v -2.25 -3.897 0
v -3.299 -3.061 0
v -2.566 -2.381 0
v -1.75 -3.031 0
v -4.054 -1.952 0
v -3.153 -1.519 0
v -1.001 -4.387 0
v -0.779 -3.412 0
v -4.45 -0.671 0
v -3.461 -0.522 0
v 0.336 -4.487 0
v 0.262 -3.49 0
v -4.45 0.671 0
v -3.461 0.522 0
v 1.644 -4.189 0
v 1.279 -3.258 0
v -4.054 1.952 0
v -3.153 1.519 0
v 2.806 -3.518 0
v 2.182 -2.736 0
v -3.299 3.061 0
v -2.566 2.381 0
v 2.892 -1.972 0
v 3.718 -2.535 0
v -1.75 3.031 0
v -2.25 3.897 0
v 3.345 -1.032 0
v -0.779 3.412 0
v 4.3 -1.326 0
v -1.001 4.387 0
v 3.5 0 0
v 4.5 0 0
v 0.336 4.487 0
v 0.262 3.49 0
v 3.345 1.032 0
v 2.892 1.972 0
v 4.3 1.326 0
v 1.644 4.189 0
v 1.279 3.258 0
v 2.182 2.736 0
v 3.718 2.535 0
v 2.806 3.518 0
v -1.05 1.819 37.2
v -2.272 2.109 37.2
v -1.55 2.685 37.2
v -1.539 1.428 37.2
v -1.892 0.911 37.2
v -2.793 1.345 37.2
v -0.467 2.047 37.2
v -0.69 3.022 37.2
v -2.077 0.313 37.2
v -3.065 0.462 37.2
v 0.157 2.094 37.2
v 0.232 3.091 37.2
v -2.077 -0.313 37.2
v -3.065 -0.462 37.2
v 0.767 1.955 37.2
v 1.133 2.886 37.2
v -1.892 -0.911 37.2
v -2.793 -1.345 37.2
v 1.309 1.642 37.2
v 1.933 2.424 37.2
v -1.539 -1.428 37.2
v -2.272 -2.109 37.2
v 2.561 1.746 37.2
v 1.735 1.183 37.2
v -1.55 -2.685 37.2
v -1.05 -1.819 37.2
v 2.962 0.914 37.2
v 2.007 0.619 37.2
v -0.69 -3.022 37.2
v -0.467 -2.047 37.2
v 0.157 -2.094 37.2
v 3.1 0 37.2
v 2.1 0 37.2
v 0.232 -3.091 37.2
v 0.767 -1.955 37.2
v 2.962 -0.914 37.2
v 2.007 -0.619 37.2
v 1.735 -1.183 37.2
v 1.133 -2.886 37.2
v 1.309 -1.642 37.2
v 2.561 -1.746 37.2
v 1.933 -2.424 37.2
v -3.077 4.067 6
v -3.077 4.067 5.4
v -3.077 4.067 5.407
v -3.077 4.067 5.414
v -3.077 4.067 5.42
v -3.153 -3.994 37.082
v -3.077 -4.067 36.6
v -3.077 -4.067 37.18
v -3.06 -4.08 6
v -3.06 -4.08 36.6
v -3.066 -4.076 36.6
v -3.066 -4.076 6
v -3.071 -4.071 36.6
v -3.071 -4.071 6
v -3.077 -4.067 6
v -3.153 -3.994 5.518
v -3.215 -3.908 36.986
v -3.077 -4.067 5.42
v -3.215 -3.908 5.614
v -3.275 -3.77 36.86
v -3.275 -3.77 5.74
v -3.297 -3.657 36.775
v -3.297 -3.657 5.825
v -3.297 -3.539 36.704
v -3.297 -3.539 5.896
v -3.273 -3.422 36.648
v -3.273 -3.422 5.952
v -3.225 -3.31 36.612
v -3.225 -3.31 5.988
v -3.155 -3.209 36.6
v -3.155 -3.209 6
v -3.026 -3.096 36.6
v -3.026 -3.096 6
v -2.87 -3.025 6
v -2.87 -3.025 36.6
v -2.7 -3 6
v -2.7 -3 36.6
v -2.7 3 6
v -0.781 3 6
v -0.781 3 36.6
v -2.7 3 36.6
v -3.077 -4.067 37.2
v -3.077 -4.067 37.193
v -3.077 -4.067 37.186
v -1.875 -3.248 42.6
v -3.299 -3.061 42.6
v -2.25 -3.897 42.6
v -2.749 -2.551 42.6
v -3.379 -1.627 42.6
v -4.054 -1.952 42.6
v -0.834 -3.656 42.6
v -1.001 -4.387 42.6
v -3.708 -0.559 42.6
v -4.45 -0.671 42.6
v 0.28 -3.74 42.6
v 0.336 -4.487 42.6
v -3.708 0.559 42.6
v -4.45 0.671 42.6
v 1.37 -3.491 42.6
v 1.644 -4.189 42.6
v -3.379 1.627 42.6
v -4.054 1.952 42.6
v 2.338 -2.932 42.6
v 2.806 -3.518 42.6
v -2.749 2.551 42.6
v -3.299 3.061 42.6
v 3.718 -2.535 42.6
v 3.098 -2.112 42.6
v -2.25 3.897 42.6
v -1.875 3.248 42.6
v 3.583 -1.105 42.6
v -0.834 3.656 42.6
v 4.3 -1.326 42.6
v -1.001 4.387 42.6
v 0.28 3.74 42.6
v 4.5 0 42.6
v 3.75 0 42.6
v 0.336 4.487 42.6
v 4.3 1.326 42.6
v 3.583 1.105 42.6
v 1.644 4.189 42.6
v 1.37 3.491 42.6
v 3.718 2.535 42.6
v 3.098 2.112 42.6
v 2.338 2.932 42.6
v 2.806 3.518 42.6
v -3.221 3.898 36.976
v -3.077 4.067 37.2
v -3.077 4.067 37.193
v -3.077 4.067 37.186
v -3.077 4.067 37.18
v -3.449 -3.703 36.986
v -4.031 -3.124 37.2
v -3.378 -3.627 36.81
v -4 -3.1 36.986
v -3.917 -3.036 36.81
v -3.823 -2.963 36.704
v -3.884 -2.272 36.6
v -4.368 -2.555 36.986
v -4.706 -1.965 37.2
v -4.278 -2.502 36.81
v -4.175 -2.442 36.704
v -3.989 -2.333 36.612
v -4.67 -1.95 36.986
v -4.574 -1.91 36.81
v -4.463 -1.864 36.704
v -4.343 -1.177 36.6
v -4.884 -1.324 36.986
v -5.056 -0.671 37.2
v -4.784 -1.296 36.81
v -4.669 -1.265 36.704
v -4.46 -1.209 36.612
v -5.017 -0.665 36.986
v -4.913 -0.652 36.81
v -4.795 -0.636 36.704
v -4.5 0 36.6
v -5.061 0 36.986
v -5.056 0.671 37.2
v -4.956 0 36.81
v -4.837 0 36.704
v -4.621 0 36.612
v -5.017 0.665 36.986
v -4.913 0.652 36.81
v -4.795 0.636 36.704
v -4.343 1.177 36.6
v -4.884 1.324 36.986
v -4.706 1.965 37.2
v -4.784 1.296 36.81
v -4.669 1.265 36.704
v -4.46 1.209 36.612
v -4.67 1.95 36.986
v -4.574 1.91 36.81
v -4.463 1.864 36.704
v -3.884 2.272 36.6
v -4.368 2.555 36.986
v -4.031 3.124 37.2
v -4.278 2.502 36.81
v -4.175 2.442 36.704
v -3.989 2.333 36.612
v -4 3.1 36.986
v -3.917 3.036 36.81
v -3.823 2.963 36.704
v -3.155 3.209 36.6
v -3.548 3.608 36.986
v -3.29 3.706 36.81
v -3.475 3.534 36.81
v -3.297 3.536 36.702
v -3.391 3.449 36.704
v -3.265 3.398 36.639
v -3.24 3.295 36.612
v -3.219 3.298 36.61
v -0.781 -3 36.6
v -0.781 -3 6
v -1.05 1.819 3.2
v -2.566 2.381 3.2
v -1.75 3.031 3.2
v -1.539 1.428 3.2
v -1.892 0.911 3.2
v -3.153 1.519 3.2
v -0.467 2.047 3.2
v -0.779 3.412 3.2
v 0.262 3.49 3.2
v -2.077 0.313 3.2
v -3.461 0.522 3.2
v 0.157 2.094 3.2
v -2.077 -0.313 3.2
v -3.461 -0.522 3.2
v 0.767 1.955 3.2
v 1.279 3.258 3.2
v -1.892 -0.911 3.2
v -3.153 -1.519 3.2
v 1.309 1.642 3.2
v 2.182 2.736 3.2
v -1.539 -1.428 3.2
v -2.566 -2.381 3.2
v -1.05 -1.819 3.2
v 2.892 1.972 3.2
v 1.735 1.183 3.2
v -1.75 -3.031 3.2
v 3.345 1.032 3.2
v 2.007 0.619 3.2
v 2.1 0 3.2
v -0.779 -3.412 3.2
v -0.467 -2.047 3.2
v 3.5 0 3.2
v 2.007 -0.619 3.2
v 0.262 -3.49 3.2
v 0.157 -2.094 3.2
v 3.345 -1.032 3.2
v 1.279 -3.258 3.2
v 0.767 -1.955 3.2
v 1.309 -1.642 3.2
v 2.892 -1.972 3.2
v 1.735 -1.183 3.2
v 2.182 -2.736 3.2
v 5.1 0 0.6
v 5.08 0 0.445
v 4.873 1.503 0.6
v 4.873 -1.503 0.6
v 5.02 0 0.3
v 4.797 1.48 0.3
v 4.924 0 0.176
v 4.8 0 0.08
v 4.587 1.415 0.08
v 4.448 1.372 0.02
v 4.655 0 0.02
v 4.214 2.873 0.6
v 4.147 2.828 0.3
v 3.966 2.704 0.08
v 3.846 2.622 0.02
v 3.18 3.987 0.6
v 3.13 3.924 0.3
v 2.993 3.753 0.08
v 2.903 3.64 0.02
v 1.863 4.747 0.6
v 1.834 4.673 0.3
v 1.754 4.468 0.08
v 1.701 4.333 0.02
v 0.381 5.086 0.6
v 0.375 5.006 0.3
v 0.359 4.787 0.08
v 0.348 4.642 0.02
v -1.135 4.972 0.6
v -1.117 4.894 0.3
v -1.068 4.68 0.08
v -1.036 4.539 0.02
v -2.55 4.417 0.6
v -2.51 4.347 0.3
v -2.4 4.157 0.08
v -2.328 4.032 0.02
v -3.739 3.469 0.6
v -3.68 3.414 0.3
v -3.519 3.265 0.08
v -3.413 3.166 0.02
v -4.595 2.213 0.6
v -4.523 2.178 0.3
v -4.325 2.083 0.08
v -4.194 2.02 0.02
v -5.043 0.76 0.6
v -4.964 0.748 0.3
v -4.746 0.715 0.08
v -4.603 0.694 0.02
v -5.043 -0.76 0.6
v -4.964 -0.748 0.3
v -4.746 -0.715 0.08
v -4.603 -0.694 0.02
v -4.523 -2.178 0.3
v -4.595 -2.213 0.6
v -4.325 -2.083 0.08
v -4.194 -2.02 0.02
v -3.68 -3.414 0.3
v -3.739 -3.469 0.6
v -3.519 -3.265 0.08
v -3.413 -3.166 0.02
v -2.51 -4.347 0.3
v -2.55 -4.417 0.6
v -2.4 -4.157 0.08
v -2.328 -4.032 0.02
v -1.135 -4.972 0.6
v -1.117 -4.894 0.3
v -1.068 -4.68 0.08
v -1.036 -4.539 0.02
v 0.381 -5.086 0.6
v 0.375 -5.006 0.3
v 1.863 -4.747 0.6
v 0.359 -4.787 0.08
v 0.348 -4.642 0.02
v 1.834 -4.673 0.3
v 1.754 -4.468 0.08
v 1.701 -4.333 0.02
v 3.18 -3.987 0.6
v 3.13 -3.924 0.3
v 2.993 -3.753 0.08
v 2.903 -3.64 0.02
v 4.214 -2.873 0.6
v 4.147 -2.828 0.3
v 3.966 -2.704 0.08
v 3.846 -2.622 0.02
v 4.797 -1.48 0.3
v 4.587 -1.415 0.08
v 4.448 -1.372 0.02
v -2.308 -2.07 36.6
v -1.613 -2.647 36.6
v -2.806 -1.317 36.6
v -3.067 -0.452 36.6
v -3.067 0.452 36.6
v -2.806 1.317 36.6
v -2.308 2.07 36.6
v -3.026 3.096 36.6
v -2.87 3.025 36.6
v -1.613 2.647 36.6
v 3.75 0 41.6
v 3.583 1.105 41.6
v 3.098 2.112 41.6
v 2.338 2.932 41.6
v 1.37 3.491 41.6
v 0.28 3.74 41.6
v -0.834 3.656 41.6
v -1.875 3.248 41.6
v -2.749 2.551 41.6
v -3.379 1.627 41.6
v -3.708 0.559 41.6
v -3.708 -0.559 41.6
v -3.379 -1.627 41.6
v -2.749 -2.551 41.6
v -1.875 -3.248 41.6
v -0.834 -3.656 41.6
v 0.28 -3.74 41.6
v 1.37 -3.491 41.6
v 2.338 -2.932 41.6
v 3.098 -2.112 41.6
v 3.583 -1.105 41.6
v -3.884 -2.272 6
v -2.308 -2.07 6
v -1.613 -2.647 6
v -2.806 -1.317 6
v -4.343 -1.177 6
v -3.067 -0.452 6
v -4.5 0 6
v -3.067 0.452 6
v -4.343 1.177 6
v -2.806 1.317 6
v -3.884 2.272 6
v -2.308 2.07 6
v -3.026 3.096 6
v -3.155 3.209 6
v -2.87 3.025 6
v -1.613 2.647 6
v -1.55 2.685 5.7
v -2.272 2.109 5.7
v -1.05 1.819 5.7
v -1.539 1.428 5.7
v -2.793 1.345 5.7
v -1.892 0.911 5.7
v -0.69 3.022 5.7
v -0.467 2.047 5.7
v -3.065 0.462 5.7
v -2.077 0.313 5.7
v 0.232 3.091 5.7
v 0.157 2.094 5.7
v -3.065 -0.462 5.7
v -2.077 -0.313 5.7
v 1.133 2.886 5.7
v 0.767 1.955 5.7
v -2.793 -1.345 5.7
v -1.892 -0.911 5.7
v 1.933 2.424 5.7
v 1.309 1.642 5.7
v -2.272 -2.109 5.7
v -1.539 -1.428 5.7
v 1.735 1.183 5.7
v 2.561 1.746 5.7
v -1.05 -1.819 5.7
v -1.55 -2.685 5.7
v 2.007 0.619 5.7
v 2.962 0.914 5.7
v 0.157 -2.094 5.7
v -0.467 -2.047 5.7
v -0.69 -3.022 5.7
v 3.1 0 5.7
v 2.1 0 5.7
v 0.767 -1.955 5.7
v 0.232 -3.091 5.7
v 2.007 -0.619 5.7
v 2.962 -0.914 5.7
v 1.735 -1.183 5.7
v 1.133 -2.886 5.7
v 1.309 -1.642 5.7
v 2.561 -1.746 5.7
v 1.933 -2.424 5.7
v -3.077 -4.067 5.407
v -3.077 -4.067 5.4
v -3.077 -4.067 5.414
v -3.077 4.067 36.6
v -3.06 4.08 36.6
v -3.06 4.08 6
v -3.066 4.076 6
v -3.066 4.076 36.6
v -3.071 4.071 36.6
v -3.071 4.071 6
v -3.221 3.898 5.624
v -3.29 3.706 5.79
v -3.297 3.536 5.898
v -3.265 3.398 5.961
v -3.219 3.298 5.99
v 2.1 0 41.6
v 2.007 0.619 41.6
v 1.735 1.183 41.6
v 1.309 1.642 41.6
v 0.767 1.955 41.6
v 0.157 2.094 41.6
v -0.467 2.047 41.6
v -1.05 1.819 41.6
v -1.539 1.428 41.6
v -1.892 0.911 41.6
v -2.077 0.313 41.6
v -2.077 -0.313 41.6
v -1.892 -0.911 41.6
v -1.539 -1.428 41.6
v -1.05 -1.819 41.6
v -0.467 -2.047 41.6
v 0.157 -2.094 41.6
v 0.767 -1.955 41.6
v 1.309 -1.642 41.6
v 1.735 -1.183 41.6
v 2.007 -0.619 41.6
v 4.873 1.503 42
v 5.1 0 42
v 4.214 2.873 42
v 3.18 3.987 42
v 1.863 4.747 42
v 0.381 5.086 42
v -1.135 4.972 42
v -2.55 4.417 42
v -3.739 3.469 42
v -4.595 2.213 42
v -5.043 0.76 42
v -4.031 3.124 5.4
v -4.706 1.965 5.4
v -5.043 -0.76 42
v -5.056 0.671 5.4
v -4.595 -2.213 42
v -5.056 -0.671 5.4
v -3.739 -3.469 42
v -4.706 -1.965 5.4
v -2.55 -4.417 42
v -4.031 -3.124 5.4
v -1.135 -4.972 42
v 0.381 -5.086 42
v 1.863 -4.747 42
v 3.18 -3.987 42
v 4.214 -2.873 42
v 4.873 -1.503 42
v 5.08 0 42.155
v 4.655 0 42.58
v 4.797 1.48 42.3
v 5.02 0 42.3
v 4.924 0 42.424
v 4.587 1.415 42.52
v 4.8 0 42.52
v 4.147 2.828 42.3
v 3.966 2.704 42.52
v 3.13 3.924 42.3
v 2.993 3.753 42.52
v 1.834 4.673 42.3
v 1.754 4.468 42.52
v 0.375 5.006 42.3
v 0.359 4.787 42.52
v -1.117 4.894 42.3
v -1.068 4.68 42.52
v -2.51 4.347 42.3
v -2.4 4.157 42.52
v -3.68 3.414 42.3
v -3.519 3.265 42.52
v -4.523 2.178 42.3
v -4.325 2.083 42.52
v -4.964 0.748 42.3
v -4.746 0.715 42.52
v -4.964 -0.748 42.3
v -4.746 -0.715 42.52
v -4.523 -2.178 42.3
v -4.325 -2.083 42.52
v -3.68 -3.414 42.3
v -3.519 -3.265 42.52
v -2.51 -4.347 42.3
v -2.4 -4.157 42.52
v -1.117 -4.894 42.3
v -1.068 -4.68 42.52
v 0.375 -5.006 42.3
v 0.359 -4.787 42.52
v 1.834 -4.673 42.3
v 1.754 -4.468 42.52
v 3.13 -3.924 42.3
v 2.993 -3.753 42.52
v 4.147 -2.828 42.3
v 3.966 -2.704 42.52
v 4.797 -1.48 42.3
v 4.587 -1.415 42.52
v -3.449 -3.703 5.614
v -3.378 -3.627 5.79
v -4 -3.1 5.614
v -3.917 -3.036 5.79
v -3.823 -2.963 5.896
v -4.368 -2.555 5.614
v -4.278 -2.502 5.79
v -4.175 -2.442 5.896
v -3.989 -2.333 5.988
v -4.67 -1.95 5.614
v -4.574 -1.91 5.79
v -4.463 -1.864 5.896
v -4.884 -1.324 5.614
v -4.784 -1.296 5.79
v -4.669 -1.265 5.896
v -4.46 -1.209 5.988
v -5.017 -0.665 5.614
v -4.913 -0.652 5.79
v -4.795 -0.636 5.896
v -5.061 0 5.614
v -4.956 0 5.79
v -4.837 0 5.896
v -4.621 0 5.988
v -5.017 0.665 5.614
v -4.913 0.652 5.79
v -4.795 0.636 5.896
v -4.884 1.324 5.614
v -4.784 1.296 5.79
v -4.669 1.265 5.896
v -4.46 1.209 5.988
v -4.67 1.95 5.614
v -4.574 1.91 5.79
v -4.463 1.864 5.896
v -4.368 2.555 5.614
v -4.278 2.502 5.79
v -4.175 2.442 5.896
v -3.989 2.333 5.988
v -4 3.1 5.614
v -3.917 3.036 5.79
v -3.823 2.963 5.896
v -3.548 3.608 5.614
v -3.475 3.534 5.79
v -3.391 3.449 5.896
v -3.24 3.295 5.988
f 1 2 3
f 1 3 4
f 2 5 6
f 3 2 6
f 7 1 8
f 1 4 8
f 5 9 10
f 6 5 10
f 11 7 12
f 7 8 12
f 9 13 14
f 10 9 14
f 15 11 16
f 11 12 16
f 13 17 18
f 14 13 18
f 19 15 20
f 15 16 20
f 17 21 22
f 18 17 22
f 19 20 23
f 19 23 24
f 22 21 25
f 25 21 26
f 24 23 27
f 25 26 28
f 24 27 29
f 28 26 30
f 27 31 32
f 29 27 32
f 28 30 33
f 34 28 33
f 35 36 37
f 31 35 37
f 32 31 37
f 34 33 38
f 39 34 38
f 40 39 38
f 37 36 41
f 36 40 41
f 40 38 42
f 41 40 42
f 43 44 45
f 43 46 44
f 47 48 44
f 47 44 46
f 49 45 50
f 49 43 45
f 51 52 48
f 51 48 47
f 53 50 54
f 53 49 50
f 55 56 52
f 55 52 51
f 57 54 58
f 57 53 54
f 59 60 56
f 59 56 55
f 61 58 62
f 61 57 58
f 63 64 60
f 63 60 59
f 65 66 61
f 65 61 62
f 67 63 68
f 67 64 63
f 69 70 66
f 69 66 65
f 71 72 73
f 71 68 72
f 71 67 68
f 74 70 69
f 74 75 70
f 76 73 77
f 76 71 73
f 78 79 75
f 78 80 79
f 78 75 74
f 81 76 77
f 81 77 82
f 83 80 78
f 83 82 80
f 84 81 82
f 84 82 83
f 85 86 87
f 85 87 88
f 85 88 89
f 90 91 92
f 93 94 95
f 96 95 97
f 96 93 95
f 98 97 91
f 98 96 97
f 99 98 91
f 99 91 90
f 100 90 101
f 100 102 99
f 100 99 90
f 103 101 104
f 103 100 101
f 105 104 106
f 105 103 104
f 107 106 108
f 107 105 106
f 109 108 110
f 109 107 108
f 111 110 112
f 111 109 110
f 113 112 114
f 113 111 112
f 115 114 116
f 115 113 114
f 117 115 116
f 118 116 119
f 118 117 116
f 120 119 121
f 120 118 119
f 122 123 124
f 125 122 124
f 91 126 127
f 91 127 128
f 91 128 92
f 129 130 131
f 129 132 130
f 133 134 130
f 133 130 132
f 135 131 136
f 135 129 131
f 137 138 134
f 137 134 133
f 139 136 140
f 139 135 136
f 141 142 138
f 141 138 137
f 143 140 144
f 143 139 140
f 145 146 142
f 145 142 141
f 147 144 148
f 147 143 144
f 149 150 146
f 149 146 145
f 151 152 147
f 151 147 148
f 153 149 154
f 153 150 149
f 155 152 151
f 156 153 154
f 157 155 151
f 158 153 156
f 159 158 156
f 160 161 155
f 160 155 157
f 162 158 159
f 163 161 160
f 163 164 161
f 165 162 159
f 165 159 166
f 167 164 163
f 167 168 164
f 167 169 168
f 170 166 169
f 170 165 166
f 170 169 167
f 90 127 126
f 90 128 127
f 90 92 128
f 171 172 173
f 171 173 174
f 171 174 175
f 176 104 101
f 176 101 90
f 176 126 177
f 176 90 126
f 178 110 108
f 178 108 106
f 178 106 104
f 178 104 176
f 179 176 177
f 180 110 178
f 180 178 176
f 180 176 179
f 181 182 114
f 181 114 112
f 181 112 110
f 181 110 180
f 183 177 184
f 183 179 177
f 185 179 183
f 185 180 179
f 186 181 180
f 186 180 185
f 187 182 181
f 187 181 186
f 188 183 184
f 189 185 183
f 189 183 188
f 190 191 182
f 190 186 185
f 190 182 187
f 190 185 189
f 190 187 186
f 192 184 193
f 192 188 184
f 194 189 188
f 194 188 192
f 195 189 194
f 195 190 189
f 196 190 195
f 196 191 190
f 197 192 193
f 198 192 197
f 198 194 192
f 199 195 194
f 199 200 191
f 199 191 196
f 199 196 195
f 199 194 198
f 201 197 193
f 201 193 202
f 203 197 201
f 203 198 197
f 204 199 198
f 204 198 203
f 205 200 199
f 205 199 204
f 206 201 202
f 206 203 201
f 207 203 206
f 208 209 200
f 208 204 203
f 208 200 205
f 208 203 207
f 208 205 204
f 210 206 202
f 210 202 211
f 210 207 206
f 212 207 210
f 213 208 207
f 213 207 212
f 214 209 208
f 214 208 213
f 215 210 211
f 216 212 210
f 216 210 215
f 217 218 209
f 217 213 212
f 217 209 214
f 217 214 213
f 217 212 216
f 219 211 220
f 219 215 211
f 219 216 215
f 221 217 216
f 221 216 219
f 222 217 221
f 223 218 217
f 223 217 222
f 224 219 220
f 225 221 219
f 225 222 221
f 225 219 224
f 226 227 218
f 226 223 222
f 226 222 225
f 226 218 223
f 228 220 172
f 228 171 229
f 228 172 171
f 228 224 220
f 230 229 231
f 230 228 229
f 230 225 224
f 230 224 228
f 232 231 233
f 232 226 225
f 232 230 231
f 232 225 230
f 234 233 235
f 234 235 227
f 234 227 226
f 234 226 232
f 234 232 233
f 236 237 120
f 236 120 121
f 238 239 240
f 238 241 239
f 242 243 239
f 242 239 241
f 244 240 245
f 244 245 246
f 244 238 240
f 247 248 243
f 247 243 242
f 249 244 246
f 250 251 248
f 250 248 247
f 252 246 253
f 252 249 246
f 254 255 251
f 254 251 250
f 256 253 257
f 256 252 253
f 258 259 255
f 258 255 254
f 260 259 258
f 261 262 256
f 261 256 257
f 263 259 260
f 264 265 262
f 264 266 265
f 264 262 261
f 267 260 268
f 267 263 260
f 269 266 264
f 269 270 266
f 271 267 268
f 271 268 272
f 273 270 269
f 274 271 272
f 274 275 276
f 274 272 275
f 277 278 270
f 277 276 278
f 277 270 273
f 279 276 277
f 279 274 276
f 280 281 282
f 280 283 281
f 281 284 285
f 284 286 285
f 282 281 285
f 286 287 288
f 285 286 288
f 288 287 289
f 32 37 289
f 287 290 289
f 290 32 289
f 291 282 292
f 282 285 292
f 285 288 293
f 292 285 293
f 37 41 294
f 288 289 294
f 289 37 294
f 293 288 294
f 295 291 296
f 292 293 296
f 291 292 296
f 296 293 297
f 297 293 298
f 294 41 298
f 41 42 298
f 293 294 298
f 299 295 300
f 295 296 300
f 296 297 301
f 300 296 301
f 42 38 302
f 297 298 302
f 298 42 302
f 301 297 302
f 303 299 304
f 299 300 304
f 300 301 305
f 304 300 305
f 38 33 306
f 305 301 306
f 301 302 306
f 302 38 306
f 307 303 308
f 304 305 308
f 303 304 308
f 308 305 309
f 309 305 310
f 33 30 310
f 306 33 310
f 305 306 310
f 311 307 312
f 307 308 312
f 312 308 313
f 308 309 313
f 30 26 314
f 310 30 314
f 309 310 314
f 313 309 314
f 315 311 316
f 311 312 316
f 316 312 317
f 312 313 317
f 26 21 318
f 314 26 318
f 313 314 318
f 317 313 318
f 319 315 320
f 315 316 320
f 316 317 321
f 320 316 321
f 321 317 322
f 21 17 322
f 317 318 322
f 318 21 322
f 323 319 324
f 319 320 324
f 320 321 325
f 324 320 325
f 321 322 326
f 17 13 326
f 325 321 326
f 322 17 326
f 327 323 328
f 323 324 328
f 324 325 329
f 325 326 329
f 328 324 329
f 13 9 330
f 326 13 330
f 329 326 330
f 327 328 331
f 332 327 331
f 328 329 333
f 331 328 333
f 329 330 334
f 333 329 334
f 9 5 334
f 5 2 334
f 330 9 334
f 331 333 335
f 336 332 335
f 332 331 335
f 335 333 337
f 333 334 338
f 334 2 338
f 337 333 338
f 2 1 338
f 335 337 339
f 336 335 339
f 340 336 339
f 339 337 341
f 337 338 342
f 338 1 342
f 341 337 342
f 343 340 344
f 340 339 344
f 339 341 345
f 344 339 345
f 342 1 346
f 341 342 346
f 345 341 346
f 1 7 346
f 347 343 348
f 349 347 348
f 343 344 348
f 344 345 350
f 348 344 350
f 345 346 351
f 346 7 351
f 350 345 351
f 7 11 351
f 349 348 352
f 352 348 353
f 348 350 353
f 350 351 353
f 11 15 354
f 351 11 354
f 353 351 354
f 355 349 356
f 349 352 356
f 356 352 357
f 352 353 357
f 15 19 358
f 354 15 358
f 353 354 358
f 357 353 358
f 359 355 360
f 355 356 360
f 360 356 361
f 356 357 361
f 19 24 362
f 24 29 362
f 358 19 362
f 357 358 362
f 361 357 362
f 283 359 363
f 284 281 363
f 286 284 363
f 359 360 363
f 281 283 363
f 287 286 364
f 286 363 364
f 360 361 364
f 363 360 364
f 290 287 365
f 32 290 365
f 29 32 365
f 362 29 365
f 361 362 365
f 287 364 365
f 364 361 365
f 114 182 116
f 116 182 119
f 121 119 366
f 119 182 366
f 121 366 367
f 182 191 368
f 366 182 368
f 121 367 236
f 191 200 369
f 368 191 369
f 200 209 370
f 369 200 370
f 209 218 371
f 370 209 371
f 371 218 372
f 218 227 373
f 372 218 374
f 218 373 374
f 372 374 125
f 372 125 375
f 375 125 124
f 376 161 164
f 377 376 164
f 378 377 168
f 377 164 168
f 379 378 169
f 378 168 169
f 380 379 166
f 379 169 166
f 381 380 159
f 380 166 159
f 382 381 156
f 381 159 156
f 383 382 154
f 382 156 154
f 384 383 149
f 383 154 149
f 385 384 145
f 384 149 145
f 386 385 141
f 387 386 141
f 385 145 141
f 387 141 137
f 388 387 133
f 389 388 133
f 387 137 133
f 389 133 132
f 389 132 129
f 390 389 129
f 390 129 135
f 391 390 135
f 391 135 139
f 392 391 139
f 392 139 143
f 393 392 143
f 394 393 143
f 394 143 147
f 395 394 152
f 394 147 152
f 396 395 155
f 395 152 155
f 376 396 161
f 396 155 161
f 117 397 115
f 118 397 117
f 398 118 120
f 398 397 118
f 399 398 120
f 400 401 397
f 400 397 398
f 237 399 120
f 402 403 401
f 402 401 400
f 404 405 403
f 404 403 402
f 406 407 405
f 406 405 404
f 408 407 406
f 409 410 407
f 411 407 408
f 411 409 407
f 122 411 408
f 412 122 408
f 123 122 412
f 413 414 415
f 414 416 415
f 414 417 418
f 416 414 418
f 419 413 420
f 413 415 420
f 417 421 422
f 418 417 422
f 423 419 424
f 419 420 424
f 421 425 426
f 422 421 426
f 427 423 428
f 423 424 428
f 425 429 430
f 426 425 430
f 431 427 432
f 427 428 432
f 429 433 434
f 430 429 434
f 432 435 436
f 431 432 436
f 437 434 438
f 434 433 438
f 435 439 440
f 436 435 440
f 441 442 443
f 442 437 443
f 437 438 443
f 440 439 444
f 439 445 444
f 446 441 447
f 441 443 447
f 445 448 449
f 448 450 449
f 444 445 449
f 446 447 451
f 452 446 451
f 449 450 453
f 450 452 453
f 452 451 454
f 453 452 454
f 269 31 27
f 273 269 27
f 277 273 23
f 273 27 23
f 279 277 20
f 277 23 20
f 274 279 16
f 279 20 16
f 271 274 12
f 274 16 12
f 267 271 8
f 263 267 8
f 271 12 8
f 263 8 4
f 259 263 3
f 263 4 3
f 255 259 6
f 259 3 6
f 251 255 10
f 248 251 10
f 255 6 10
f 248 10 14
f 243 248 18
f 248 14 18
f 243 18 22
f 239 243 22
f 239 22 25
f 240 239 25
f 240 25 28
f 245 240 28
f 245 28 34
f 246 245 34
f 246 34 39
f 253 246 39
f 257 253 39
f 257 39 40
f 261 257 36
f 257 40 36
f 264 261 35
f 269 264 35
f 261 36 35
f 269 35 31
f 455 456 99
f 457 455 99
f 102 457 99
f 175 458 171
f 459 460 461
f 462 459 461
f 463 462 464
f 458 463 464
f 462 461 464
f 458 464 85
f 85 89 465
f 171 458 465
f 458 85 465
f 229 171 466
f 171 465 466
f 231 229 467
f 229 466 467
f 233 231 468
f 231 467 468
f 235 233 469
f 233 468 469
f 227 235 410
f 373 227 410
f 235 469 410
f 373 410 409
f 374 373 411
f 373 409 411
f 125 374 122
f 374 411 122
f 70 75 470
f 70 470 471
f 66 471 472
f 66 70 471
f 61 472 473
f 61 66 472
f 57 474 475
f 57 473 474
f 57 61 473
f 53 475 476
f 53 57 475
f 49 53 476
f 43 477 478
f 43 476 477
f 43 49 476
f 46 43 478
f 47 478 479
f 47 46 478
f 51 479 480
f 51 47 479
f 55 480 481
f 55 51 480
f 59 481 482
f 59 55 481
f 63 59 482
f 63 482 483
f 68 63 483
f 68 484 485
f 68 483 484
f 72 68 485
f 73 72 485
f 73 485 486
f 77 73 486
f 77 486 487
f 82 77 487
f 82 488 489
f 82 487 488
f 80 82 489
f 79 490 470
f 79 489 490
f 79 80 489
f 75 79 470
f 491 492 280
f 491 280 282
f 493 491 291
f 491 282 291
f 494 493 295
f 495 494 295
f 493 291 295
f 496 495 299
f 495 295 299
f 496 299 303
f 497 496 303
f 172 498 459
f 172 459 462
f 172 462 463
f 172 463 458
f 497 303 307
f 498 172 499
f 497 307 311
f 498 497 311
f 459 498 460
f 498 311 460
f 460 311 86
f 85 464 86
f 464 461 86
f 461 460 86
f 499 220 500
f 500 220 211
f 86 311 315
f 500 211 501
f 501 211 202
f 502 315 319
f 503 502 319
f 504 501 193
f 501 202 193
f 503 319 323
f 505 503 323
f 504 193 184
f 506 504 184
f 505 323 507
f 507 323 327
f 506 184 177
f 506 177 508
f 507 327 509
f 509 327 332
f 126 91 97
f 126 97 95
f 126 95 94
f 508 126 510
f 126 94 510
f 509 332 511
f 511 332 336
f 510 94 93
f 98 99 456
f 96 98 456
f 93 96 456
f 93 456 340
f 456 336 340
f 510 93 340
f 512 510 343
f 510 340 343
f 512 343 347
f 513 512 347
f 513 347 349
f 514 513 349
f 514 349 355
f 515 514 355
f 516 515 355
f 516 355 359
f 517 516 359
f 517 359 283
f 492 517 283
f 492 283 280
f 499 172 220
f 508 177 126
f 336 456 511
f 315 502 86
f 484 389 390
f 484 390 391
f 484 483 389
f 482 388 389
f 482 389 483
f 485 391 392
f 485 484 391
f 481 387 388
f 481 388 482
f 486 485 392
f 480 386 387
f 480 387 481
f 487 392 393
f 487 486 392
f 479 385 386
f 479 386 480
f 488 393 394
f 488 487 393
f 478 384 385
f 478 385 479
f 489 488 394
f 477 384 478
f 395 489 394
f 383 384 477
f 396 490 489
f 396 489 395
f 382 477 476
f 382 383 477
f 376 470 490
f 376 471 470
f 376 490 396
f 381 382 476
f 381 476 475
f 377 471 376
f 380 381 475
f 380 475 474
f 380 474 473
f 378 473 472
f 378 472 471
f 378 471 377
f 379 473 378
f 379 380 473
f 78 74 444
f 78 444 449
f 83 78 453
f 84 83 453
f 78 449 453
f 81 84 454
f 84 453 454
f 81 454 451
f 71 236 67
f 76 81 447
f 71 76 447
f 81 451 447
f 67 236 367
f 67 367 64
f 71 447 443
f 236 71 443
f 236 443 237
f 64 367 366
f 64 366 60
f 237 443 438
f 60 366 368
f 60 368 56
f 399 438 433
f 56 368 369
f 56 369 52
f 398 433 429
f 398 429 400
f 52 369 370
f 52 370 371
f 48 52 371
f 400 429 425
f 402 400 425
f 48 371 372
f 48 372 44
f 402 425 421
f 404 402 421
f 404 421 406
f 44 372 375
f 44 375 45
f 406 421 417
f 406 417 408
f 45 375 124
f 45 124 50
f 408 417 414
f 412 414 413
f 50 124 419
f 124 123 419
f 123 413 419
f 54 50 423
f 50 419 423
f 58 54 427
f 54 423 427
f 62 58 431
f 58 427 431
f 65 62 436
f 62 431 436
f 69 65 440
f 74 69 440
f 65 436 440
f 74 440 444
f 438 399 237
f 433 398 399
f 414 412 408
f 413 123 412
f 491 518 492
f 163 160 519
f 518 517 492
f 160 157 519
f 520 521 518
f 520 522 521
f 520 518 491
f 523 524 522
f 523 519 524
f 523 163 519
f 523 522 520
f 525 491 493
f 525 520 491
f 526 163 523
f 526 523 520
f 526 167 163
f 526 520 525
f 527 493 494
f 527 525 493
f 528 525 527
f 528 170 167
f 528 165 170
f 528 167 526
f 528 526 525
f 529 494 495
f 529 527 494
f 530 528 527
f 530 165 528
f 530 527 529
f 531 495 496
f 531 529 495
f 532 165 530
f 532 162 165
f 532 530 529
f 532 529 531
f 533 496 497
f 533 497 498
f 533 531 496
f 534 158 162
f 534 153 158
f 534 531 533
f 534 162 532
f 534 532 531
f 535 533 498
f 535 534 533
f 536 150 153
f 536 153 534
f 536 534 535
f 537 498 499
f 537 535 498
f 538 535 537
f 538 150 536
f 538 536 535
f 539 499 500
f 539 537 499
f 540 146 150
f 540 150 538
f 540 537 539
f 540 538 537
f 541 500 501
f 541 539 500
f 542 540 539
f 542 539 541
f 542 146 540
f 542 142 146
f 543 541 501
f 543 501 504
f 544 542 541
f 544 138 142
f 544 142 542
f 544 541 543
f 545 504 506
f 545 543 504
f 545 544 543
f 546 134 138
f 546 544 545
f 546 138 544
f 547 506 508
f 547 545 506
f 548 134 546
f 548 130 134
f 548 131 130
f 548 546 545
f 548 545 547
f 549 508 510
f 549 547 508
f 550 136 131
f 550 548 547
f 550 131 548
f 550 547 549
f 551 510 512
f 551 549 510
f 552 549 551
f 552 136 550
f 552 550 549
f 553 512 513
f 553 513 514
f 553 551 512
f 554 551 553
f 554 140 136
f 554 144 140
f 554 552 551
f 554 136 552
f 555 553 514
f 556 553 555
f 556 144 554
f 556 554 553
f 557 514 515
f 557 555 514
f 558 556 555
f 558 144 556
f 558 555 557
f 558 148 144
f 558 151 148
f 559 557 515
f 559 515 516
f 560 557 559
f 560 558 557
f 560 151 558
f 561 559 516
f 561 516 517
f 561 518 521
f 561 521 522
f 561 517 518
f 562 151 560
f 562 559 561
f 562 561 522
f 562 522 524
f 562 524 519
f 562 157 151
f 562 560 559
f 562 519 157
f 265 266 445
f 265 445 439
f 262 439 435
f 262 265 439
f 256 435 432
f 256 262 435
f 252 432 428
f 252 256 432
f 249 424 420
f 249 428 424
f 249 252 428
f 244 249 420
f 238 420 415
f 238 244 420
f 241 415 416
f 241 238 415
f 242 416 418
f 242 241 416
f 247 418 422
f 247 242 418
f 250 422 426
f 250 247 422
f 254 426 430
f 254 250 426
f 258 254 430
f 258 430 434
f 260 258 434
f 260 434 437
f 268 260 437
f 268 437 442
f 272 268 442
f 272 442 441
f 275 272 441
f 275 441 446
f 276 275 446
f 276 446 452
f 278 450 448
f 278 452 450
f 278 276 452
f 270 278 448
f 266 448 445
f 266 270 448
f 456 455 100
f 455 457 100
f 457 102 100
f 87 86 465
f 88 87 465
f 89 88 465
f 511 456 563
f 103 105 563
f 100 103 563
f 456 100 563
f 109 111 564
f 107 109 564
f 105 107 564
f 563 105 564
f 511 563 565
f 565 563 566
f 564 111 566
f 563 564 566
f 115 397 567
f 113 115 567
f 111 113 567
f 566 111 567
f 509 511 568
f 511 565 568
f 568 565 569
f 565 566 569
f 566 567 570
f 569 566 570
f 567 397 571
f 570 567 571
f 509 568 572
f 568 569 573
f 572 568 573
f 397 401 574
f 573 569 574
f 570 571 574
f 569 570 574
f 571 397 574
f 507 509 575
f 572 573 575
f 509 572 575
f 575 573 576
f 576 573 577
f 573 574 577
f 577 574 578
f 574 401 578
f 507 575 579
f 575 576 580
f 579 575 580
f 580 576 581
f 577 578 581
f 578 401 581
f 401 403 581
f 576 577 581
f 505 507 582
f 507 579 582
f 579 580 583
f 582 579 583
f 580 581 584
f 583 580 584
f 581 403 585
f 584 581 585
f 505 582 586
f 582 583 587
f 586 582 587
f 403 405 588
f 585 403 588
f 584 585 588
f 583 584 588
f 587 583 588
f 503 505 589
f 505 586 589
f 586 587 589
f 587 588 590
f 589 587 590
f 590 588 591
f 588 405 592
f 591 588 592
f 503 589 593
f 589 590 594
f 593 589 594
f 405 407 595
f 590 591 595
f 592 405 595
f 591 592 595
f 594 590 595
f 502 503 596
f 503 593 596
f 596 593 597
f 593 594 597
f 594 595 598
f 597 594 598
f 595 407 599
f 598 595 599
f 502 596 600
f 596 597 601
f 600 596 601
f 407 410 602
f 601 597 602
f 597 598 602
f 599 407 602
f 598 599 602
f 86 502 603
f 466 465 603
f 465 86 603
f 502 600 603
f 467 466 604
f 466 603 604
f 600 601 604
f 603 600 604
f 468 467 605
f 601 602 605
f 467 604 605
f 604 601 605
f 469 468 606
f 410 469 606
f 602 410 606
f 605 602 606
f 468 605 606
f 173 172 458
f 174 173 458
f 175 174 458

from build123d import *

# Parameters (mm, degrees)
F0_R          = 5.1
F0_R_2        = 2.1
F1_DEPTH      = 42.6
F2_R          = 3.5
F3_DEPTH      = 3.2
F4_R          = 3.75
F5_DEPTH      = 1
F6_W          = 6
F6_H          = 30.6
F7_DEPTH      = 25
F9_START      = -2.5
F8_R          = 3.1
F9_DEPTH      = 31.5
F10_T1_DEPTH  = 30.6
F10_T10_ANGLE = 105.7758372511
F10_T16_ANGLE = 105.7758372511
F10_T23_DEPTH = 34.3907560857
F10_T27_ANGLE = 105.7758372511
F10_T34_ANGLE = 105.7758372511
F10_T38_DEPTH = 34.3907560857
F10_T45_DEPTH = 34.3907560857
F10_T49_ANGLE = 105.7758372511
F10_T56_DEPTH = 34.3907560857
F10_T60_ANGLE = 105.7758372511


# Not quite as in the source:
# - a fillet or chamfer that OpenCascade refuses, or shapes differently, is made with other operations: its cross-section is extruded or revolved along the edge and cut away or added


with BuildPart() as f1:
    # F0 (on Top) → F1 (new body)
    with BuildSketch(Plane.XY):
        Circle(F0_R)
        Circle(F0_R_2, mode=Mode.SUBTRACT)
    extrude(amount=F1_DEPTH)

    # F2 (on face) → F3 (cut)
    with BuildSketch(Plane(origin=(0, 0, 0), x_dir=(1, 0, 0), z_dir=(0, 0, -1))):
        Circle(F2_R)
    extrude(amount=-F3_DEPTH, mode=Mode.SUBTRACT)

    # F4 (on face) → F5 (cut)
    with BuildSketch(Plane.XY.offset(42.6)):
        Circle(F4_R)
    extrude(amount=-F5_DEPTH, mode=Mode.SUBTRACT)

    # F6 (on Right) → F7 (cut)
    with BuildSketch(Plane.YZ):
        with Locations((0, 21.3)):
            Rectangle(F6_W, F6_H)
    extrude(amount=-F7_DEPTH, mode=Mode.SUBTRACT)

    # F8 (on face) → F9 (cut)
    with BuildSketch(Plane(origin=(0, 0, 3.2), x_dir=(1, 0, 0), z_dir=(0, 0, -1)).offset(F9_START)):
        Circle(F8_R)
    extrude(amount=-F9_DEPTH, mode=Mode.SUBTRACT)

    # F10: fillet of radius 0.6 on 6 edges, made by hand

    # F10_s2 → F10_t1 (cut)
    with BuildSketch(Plane.XY.offset(6)):
        with BuildLine():
            ThreePointArc((-3.06, 4.08), (-3.2692099788, 3.4102633404), (-2.7, 3))
            Line((-2.7, 3), (-4.1243181255, 3))
            ThreePointArc((-4.1243181255, 3), (-3.6325207132, 3.5797755891), (-3.06, 4.08))
        make_face()
        with BuildLine():
            ThreePointArc((-3.06, -4.08), (-3.2692099788, -3.4102633404), (-2.7, -3))
            Line((-2.7, -3), (-4.1243181255, -3))
            ThreePointArc((-4.1243181255, -3), (-3.6325207132, -3.5797755891), (-3.06, -4.08))
        make_face()
    extrude(amount=F10_T1_DEPTH, mode=Mode.SUBTRACT)

    # F10_s3 → F10_t4 (revolve, cut)
    with BuildSketch(Plane.XZ):
        with BuildLine():
            ThreePointArc((5.1, 42), (4.9242640687, 42.4242640687), (4.5, 42.6))
            Line((4.5, 42.6), (5.1, 42.6))
            Line((5.1, 42.6), (5.1, 42))
        make_face()
    revolve(axis=Axis((0, 0, 42.6), (0, 0, 1)), mode=Mode.SUBTRACT)

    # F10_s5 → F10_t6 (revolve, cut)
    with BuildSketch(Plane.XZ):
        with BuildLine():
            ThreePointArc((5.1, 0.6), (4.9242640687, 0.1757359313), (4.5, 0))
            Line((4.5, 0), (5.1, 0))
            Line((5.1, 0), (5.1, 0.6))
        make_face()
    revolve(axis=Axis((0, 0, 0), (0, 0, 1)), mode=Mode.SUBTRACT)


with BuildPart() as f10_tool8:
    # F10_s9 → F10_t10 (revolve)
    with BuildSketch(Plane(origin=(0, 0, 0), x_dir=(0, 0, 1), z_dir=(0.7974567188, -0.6033761527, 0))):
        with BuildLine():
            ThreePointArc((5.4, 5.1), (5.8242640687, 4.9242640687), (6, 4.5))
            Line((6, 4.5), (6, 5.1))
            Line((6, 5.1), (5.4, 5.1))
        make_face()
    revolve(axis=Axis((0, 0, 6), (0, 0, -1)), revolution_arc=F10_T10_ANGLE)

    split(bisect_by=Plane.XZ.offset(3), keep=Keep.BOTTOM)

    split(bisect_by=Plane.XZ.offset(-3), keep=Keep.TOP)


with BuildPart() as f1_1:
    add(f1.part)

    # F10_t7: cut F10_tool8
    add(f10_tool8.part, mode=Mode.SUBTRACT)


with BuildPart() as f10_tool14:
    # F10_s15 → F10_t16 (revolve)
    with BuildSketch(Plane(origin=(0, 0, 0), x_dir=(0, 0, 1), z_dir=(0.7974567188, -0.6033761527, 0))):
        with BuildLine():
            ThreePointArc((37.2, 5.1), (36.7757359313, 4.9242640687), (36.6, 4.5))
            Line((36.6, 4.5), (36.6, 5.1))
            Line((36.6, 5.1), (37.2, 5.1))
        make_face()
    revolve(axis=Axis((0, 0, 36.6), (0, 0, -1)), revolution_arc=F10_T16_ANGLE)

    split(bisect_by=Plane.XZ.offset(3), keep=Keep.BOTTOM)

    split(bisect_by=Plane.XZ.offset(-3), keep=Keep.TOP)


with BuildPart() as f1_2:
    add(f1_1.part)

    # F10_t13: cut F10_tool14
    add(f10_tool14.part, mode=Mode.SUBTRACT)


with BuildPart() as f10_tool21:
    # F10_s22 → F10_t23 (new body)
    with BuildSketch(Plane.XY.offset(36.6)):
        with BuildLine():
            ThreePointArc((-3.06, -4.08), (-3.2692099788, -3.4102633404), (-2.7, -3))
            Line((-2.7, -3), (-4.1243181255, -3))
            ThreePointArc((-4.1243181255, -3), (-3.6325207132, -3.5797755891), (-3.06, -4.08))
        make_face()
    extrude(amount=-F10_T23_DEPTH)

    split(bisect_by=Plane.XY.offset(6), keep=Keep.BOTTOM)


with BuildPart() as f10_tool25:
    # F10_s26 → F10_t27 (revolve)
    with BuildSketch(Plane(origin=(0, 0, 0), x_dir=(0, 0, 1), z_dir=(0.7974567188, -0.6033761527, 0))):
        with BuildLine():
            ThreePointArc((5.4, 5.1), (5.8242640687, 4.9242640687), (6, 4.5))
            Line((6, 4.5), (6, 5.1))
            Line((6, 5.1), (5.4, 5.1))
        make_face()
    revolve(axis=Axis((0, 0, 6), (0, 0, -1)), revolution_arc=F10_T27_ANGLE)

    split(bisect_by=Plane.XZ.offset(3), keep=Keep.TOP)


with BuildPart() as f10_tool21_1:
    add(f10_tool21.part)

    # F10_t29: intersect F10_tool25
    add(f10_tool25.part, mode=Mode.INTERSECT)


with BuildPart() as f1_3:
    add(f1_2.part)

    # F10_t19: cut F10_tool21
    add(f10_tool21_1.part, mode=Mode.SUBTRACT)


with BuildPart() as f10_tool32:
    # F10_s33 → F10_t34 (revolve)
    with BuildSketch(Plane(origin=(0, 0, 0), x_dir=(0, 0, 1), z_dir=(0.7974567188, -0.6033761527, 0))):
        with BuildLine():
            ThreePointArc((5.4, 5.1), (5.8242640687, 4.9242640687), (6, 4.5))
            Line((6, 4.5), (6, 5.1))
            Line((6, 5.1), (5.4, 5.1))
        make_face()
    revolve(axis=Axis((0, 0, 6), (0, 0, -1)), revolution_arc=F10_T34_ANGLE)

    split(bisect_by=Plane.XZ.offset(-3), keep=Keep.BOTTOM)


with BuildPart() as f10_tool36:
    # F10_s37 → F10_t38 (new body)
    with BuildSketch(Plane.XY.offset(36.6)):
        with BuildLine():
            ThreePointArc((-3.06, 4.08), (-3.2692099788, 3.4102633404), (-2.7, 3))
            Line((-2.7, 3), (-4.1243181255, 3))
            ThreePointArc((-4.1243181255, 3), (-3.6325207132, 3.5797755891), (-3.06, 4.08))
        make_face()
    extrude(amount=-F10_T38_DEPTH)

    split(bisect_by=Plane.XY.offset(6), keep=Keep.BOTTOM)


with BuildPart() as f10_tool32_1:
    add(f10_tool32.part)

    # F10_t40: intersect F10_tool36
    add(f10_tool36.part, mode=Mode.INTERSECT)


with BuildPart() as f1_4:
    add(f1_3.part)

    # F10_t30: cut F10_tool32
    add(f10_tool32_1.part, mode=Mode.SUBTRACT)


with BuildPart() as f10_tool43:
    # F10_s44 → F10_t45 (new body)
    with BuildSketch(Plane.XY.offset(40.3907560857)):
        with BuildLine():
            ThreePointArc((-3.06, 4.08), (-3.2692099788, 3.4102633404), (-2.7, 3))
            Line((-2.7, 3), (-4.1243181255, 3))
            ThreePointArc((-4.1243181255, 3), (-3.6325207132, 3.5797755891), (-3.06, 4.08))
        make_face()
    extrude(amount=-F10_T45_DEPTH)

    split(bisect_by=Plane.XY.offset(36.6), keep=Keep.TOP)


with BuildPart() as f10_tool47:
    # F10_s48 → F10_t49 (revolve)
    with BuildSketch(Plane(origin=(0, 0, 0), x_dir=(0, 0, 1), z_dir=(0.7974567188, -0.6033761527, 0))):
        with BuildLine():
            ThreePointArc((37.2, 5.1), (36.7757359313, 4.9242640687), (36.6, 4.5))
            Line((36.6, 4.5), (36.6, 5.1))
            Line((36.6, 5.1), (37.2, 5.1))
        make_face()
    revolve(axis=Axis((0, 0, 36.6), (0, 0, -1)), revolution_arc=F10_T49_ANGLE)

    split(bisect_by=Plane.XZ.offset(-3), keep=Keep.BOTTOM)


with BuildPart() as f10_tool43_1:
    add(f10_tool43.part)

    # F10_t51: intersect F10_tool47
    add(f10_tool47.part, mode=Mode.INTERSECT)


with BuildPart() as f1_5:
    add(f1_4.part)

    # F10_t41: cut F10_tool43
    add(f10_tool43_1.part, mode=Mode.SUBTRACT)


with BuildPart() as f10_tool54:
    # F10_s55 → F10_t56 (new body)
    with BuildSketch(Plane.XY.offset(40.3907560857)):
        with BuildLine():
            ThreePointArc((-3.06, -4.08), (-3.2692099788, -3.4102633404), (-2.7, -3))
            Line((-2.7, -3), (-4.1243181255, -3))
            ThreePointArc((-4.1243181255, -3), (-3.6325207132, -3.5797755891), (-3.06, -4.08))
        make_face()
    extrude(amount=-F10_T56_DEPTH)

    split(bisect_by=Plane.XY.offset(36.6), keep=Keep.TOP)


with BuildPart() as f10_tool58:
    # F10_s59 → F10_t60 (revolve)
    with BuildSketch(Plane(origin=(0, 0, 0), x_dir=(0, 0, 1), z_dir=(0.7974567188, -0.6033761527, 0))):
        with BuildLine():
            ThreePointArc((37.2, 5.1), (36.7757359313, 4.9242640687), (36.6, 4.5))
            Line((36.6, 4.5), (36.6, 5.1))
            Line((36.6, 5.1), (37.2, 5.1))
        make_face()
    revolve(axis=Axis((0, 0, 36.6), (0, 0, -1)), revolution_arc=F10_T60_ANGLE)

    split(bisect_by=Plane.XZ.offset(3), keep=Keep.TOP)


with BuildPart() as f10_tool54_1:
    add(f10_tool54.part)

    # F10_t62: intersect F10_tool58
    add(f10_tool58.part, mode=Mode.INTERSECT)


with BuildPart() as f1_6:
    add(f1_5.part)

    # F10_t52: cut F10_tool54
    add(f10_tool54_1.part, mode=Mode.SUBTRACT)


solid = f1_6.part
